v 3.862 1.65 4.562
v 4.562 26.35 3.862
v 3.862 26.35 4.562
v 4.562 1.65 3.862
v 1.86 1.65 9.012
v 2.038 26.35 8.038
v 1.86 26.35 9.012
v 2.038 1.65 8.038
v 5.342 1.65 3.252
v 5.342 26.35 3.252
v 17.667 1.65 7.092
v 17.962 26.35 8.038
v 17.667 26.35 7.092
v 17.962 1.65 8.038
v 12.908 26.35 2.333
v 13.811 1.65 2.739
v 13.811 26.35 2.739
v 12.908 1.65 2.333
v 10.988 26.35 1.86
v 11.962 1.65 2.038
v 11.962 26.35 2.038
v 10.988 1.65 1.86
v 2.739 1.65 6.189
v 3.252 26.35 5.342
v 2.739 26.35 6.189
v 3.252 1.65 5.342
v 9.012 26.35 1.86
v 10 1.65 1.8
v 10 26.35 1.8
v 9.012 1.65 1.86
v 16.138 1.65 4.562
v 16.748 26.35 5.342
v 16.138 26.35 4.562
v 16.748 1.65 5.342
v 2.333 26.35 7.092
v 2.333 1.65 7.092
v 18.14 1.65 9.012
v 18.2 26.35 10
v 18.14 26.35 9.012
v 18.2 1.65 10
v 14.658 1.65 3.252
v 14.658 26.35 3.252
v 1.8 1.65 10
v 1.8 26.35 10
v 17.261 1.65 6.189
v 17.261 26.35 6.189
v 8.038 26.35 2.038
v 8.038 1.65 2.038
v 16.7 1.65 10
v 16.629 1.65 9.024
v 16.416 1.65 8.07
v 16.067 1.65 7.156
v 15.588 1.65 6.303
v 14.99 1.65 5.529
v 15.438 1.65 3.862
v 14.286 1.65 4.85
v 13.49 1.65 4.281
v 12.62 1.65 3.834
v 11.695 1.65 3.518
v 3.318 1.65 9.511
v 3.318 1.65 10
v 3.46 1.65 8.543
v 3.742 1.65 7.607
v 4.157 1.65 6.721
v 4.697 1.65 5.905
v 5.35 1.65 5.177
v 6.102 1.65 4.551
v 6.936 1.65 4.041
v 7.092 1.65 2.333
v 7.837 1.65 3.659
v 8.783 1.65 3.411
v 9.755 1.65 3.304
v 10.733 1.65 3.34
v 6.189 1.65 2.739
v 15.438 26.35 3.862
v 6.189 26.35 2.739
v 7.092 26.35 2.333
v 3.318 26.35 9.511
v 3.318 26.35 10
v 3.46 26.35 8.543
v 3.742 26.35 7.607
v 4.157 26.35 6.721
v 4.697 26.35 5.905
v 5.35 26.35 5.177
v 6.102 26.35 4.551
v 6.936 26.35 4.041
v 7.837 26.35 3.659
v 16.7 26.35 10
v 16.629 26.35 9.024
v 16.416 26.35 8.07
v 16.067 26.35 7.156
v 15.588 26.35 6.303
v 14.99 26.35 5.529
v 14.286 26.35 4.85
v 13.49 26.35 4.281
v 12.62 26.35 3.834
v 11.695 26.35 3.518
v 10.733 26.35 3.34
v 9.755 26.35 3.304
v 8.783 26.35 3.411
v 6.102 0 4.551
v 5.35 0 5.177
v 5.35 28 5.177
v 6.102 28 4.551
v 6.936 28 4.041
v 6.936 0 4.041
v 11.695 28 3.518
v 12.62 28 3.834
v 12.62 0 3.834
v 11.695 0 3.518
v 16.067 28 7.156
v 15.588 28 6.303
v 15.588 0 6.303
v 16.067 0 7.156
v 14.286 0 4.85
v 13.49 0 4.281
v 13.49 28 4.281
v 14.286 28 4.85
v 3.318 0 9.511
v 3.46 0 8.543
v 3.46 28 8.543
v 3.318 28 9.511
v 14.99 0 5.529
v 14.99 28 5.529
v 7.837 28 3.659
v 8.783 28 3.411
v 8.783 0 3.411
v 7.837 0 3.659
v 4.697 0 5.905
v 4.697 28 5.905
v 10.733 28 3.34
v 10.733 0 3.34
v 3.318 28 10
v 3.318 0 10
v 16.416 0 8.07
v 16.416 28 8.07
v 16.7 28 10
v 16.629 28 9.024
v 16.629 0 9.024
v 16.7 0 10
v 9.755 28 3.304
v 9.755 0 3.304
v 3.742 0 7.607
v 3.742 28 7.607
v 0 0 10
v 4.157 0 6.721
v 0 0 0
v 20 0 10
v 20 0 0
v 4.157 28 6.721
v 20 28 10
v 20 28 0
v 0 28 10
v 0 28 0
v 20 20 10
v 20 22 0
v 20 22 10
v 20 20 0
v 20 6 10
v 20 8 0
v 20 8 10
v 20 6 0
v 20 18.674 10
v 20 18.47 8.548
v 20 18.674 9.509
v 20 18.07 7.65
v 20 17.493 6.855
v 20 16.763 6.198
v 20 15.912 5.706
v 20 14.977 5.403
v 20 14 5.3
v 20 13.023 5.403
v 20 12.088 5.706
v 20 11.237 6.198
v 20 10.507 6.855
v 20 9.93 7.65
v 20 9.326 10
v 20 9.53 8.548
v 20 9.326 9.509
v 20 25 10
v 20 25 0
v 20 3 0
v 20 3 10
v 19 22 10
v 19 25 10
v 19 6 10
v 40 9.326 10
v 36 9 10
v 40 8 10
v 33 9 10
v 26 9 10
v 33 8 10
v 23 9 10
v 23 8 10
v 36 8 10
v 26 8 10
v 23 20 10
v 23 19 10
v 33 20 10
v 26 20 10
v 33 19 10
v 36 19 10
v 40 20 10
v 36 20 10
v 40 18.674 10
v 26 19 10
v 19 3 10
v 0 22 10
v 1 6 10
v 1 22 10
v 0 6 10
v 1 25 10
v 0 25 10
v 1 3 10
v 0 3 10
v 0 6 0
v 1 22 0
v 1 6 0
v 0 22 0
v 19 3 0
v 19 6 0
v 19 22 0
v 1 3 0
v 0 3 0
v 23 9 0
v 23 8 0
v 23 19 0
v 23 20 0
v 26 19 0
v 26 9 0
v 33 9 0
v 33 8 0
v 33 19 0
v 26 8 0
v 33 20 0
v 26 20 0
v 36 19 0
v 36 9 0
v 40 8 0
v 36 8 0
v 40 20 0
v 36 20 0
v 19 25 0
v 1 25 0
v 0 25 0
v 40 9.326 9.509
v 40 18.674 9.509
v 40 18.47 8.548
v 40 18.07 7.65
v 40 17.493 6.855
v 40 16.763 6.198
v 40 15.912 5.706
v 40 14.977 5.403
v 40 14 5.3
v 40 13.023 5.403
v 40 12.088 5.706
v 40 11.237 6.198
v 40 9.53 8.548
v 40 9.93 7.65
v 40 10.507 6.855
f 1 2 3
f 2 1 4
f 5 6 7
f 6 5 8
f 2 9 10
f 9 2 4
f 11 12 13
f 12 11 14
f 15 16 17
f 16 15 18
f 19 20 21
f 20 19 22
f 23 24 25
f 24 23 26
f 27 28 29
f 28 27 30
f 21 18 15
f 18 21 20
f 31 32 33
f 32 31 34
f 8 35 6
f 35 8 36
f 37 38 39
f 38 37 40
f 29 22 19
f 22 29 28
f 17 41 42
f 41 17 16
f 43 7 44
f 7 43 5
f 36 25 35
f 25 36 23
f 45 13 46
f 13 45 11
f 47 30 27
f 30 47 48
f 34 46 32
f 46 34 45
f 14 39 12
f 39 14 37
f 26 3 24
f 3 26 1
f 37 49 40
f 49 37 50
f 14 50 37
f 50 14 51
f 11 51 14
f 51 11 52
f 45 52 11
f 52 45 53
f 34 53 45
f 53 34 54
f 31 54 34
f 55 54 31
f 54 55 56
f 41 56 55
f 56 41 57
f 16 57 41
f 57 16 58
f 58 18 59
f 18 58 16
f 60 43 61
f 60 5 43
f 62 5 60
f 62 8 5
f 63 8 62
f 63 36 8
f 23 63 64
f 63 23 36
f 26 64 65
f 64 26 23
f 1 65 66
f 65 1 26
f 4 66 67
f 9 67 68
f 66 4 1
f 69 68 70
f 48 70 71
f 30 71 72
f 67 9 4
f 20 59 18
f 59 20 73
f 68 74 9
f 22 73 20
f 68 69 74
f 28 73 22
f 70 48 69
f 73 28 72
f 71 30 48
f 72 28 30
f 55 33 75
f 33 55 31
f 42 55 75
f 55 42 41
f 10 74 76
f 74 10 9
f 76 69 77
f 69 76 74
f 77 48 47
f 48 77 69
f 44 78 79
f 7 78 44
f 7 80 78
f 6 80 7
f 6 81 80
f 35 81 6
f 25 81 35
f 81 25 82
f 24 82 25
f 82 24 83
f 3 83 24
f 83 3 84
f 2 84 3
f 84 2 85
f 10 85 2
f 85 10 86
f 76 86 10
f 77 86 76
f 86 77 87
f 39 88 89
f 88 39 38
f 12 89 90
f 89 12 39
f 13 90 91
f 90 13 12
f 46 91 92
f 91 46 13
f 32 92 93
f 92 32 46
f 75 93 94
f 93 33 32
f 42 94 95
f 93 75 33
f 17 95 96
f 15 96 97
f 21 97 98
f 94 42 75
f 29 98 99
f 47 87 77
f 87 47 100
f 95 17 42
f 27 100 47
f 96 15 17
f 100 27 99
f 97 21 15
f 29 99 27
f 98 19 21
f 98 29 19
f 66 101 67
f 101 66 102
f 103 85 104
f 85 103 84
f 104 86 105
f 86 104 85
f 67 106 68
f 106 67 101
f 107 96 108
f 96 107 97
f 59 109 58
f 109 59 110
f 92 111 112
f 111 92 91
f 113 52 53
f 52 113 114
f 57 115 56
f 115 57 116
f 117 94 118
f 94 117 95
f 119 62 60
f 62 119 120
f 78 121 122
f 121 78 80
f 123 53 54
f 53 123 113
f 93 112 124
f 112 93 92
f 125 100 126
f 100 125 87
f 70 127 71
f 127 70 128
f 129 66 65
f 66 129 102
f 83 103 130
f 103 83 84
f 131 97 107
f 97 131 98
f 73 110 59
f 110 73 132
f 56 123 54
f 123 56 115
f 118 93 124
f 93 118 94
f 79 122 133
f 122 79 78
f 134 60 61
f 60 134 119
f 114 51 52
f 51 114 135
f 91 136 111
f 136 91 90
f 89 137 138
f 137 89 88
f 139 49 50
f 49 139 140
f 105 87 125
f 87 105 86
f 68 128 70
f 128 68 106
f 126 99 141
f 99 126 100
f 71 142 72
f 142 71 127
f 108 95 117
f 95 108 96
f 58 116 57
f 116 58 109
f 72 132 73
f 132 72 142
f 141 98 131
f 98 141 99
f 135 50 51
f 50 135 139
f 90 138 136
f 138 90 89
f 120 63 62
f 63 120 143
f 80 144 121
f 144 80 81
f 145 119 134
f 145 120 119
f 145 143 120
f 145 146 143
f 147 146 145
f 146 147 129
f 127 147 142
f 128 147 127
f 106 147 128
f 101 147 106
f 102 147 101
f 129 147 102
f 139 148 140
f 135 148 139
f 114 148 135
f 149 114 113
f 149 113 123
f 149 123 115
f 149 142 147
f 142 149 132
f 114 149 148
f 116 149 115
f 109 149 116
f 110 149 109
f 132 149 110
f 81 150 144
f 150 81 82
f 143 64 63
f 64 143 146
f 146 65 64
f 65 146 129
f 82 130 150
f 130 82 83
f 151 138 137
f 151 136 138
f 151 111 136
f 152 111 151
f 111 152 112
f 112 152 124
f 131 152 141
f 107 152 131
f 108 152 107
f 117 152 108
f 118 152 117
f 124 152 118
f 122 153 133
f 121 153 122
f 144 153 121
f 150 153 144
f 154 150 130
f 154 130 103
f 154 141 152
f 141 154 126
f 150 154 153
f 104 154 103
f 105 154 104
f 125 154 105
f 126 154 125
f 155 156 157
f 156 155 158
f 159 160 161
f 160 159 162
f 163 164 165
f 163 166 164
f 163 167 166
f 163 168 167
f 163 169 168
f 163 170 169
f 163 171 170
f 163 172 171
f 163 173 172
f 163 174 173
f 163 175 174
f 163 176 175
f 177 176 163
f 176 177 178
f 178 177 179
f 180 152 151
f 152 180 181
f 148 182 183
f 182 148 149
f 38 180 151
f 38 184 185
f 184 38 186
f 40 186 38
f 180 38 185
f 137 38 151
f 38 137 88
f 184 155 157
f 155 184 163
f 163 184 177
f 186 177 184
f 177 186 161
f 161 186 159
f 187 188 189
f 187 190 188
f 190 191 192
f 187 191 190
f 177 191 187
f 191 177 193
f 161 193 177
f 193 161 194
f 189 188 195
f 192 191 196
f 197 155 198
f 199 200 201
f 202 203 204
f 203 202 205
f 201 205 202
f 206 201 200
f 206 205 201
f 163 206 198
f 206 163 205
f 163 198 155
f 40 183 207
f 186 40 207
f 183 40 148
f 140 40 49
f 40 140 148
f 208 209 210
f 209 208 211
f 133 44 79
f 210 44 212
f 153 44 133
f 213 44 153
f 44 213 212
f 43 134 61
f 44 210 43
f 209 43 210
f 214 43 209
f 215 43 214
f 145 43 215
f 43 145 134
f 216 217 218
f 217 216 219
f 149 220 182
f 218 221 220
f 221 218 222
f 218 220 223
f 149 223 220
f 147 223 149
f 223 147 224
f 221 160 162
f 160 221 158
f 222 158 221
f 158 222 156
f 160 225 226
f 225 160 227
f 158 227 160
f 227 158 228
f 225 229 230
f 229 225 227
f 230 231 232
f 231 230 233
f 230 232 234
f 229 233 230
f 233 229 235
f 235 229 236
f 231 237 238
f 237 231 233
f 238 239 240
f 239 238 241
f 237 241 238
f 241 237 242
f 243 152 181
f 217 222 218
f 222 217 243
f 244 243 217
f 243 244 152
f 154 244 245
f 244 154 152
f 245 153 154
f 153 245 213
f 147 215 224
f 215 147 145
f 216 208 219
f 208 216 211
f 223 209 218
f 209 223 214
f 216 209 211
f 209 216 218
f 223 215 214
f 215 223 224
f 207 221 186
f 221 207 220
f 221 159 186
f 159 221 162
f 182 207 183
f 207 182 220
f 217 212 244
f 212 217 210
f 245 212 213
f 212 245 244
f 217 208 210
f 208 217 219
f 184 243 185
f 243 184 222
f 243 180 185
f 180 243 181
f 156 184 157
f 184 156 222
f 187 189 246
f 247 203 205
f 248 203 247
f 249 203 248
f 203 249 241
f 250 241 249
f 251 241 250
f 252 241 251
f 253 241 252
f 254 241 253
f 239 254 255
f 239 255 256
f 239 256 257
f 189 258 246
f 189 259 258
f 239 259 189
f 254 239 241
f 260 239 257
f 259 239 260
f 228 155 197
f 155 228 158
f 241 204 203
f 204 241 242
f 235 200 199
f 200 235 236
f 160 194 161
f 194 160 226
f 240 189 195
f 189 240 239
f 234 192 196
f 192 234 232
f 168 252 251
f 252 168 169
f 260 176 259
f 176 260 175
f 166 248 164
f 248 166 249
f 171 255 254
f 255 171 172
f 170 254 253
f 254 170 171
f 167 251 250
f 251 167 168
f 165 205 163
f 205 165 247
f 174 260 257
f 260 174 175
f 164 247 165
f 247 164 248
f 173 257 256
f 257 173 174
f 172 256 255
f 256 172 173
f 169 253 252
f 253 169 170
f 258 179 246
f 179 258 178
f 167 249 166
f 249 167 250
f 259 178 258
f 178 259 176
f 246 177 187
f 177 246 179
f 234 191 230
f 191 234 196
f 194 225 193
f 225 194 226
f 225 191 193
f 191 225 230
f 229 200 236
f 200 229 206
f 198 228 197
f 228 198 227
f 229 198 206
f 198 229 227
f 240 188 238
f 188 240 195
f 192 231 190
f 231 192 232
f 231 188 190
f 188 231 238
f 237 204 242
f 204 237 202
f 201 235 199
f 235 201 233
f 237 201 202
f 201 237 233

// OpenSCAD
$fa = 1;
$fs = 1;
mg = 0.7;

module socle_roulement() {
	difference() {
		cube([20, 28, 10]);
		translate([10, 14, 10]) {
		  rotate(90, [1, 0, 0]) {
		   cylinder(24 + mg, 7.5 + mg, 7.5 + mg, true);
		   # cylinder(28, 6 + mg, 6 + mg, true);
		  }			
		}
		translate([0, 3, 0]) cube([1, 3, 10]);		
		translate([19, 3, 0]) cube([1, 3, 10]);		
		translate([0, 28-3-3, 0]) cube([1, 3, 10]);		
		translate([19, 28-3-3, 0]) cube([1, 3, 10]);		
	}
}

module socle_barre() {
	difference() {
		translate([0, -6, 0]) {
			cube([20, 12, 10]);
		}
		translate([0, 0, 10]) {
			rotate(90, [0, 1, 0]) {
				cylinder(20, 4 + mg, 4 + mg);
			}
		}
		translate([3, -6, 0]) cube([3, 1, 10]);		
		translate([3, 6-1, 0]) cube([3, 1, 10]);		
		translate([13, -6, 0]) cube([3, 1, 10]);		
		translate([13, 6-1, 0]) cube([3, 1, 10]);		
	}
}

module support1() {

	union() {
		socle_roulement();
		translate([20, 14, 0]) {
			socle_barre();
			// cube([10, 24, 3]);
		}
	}
}

support1();
